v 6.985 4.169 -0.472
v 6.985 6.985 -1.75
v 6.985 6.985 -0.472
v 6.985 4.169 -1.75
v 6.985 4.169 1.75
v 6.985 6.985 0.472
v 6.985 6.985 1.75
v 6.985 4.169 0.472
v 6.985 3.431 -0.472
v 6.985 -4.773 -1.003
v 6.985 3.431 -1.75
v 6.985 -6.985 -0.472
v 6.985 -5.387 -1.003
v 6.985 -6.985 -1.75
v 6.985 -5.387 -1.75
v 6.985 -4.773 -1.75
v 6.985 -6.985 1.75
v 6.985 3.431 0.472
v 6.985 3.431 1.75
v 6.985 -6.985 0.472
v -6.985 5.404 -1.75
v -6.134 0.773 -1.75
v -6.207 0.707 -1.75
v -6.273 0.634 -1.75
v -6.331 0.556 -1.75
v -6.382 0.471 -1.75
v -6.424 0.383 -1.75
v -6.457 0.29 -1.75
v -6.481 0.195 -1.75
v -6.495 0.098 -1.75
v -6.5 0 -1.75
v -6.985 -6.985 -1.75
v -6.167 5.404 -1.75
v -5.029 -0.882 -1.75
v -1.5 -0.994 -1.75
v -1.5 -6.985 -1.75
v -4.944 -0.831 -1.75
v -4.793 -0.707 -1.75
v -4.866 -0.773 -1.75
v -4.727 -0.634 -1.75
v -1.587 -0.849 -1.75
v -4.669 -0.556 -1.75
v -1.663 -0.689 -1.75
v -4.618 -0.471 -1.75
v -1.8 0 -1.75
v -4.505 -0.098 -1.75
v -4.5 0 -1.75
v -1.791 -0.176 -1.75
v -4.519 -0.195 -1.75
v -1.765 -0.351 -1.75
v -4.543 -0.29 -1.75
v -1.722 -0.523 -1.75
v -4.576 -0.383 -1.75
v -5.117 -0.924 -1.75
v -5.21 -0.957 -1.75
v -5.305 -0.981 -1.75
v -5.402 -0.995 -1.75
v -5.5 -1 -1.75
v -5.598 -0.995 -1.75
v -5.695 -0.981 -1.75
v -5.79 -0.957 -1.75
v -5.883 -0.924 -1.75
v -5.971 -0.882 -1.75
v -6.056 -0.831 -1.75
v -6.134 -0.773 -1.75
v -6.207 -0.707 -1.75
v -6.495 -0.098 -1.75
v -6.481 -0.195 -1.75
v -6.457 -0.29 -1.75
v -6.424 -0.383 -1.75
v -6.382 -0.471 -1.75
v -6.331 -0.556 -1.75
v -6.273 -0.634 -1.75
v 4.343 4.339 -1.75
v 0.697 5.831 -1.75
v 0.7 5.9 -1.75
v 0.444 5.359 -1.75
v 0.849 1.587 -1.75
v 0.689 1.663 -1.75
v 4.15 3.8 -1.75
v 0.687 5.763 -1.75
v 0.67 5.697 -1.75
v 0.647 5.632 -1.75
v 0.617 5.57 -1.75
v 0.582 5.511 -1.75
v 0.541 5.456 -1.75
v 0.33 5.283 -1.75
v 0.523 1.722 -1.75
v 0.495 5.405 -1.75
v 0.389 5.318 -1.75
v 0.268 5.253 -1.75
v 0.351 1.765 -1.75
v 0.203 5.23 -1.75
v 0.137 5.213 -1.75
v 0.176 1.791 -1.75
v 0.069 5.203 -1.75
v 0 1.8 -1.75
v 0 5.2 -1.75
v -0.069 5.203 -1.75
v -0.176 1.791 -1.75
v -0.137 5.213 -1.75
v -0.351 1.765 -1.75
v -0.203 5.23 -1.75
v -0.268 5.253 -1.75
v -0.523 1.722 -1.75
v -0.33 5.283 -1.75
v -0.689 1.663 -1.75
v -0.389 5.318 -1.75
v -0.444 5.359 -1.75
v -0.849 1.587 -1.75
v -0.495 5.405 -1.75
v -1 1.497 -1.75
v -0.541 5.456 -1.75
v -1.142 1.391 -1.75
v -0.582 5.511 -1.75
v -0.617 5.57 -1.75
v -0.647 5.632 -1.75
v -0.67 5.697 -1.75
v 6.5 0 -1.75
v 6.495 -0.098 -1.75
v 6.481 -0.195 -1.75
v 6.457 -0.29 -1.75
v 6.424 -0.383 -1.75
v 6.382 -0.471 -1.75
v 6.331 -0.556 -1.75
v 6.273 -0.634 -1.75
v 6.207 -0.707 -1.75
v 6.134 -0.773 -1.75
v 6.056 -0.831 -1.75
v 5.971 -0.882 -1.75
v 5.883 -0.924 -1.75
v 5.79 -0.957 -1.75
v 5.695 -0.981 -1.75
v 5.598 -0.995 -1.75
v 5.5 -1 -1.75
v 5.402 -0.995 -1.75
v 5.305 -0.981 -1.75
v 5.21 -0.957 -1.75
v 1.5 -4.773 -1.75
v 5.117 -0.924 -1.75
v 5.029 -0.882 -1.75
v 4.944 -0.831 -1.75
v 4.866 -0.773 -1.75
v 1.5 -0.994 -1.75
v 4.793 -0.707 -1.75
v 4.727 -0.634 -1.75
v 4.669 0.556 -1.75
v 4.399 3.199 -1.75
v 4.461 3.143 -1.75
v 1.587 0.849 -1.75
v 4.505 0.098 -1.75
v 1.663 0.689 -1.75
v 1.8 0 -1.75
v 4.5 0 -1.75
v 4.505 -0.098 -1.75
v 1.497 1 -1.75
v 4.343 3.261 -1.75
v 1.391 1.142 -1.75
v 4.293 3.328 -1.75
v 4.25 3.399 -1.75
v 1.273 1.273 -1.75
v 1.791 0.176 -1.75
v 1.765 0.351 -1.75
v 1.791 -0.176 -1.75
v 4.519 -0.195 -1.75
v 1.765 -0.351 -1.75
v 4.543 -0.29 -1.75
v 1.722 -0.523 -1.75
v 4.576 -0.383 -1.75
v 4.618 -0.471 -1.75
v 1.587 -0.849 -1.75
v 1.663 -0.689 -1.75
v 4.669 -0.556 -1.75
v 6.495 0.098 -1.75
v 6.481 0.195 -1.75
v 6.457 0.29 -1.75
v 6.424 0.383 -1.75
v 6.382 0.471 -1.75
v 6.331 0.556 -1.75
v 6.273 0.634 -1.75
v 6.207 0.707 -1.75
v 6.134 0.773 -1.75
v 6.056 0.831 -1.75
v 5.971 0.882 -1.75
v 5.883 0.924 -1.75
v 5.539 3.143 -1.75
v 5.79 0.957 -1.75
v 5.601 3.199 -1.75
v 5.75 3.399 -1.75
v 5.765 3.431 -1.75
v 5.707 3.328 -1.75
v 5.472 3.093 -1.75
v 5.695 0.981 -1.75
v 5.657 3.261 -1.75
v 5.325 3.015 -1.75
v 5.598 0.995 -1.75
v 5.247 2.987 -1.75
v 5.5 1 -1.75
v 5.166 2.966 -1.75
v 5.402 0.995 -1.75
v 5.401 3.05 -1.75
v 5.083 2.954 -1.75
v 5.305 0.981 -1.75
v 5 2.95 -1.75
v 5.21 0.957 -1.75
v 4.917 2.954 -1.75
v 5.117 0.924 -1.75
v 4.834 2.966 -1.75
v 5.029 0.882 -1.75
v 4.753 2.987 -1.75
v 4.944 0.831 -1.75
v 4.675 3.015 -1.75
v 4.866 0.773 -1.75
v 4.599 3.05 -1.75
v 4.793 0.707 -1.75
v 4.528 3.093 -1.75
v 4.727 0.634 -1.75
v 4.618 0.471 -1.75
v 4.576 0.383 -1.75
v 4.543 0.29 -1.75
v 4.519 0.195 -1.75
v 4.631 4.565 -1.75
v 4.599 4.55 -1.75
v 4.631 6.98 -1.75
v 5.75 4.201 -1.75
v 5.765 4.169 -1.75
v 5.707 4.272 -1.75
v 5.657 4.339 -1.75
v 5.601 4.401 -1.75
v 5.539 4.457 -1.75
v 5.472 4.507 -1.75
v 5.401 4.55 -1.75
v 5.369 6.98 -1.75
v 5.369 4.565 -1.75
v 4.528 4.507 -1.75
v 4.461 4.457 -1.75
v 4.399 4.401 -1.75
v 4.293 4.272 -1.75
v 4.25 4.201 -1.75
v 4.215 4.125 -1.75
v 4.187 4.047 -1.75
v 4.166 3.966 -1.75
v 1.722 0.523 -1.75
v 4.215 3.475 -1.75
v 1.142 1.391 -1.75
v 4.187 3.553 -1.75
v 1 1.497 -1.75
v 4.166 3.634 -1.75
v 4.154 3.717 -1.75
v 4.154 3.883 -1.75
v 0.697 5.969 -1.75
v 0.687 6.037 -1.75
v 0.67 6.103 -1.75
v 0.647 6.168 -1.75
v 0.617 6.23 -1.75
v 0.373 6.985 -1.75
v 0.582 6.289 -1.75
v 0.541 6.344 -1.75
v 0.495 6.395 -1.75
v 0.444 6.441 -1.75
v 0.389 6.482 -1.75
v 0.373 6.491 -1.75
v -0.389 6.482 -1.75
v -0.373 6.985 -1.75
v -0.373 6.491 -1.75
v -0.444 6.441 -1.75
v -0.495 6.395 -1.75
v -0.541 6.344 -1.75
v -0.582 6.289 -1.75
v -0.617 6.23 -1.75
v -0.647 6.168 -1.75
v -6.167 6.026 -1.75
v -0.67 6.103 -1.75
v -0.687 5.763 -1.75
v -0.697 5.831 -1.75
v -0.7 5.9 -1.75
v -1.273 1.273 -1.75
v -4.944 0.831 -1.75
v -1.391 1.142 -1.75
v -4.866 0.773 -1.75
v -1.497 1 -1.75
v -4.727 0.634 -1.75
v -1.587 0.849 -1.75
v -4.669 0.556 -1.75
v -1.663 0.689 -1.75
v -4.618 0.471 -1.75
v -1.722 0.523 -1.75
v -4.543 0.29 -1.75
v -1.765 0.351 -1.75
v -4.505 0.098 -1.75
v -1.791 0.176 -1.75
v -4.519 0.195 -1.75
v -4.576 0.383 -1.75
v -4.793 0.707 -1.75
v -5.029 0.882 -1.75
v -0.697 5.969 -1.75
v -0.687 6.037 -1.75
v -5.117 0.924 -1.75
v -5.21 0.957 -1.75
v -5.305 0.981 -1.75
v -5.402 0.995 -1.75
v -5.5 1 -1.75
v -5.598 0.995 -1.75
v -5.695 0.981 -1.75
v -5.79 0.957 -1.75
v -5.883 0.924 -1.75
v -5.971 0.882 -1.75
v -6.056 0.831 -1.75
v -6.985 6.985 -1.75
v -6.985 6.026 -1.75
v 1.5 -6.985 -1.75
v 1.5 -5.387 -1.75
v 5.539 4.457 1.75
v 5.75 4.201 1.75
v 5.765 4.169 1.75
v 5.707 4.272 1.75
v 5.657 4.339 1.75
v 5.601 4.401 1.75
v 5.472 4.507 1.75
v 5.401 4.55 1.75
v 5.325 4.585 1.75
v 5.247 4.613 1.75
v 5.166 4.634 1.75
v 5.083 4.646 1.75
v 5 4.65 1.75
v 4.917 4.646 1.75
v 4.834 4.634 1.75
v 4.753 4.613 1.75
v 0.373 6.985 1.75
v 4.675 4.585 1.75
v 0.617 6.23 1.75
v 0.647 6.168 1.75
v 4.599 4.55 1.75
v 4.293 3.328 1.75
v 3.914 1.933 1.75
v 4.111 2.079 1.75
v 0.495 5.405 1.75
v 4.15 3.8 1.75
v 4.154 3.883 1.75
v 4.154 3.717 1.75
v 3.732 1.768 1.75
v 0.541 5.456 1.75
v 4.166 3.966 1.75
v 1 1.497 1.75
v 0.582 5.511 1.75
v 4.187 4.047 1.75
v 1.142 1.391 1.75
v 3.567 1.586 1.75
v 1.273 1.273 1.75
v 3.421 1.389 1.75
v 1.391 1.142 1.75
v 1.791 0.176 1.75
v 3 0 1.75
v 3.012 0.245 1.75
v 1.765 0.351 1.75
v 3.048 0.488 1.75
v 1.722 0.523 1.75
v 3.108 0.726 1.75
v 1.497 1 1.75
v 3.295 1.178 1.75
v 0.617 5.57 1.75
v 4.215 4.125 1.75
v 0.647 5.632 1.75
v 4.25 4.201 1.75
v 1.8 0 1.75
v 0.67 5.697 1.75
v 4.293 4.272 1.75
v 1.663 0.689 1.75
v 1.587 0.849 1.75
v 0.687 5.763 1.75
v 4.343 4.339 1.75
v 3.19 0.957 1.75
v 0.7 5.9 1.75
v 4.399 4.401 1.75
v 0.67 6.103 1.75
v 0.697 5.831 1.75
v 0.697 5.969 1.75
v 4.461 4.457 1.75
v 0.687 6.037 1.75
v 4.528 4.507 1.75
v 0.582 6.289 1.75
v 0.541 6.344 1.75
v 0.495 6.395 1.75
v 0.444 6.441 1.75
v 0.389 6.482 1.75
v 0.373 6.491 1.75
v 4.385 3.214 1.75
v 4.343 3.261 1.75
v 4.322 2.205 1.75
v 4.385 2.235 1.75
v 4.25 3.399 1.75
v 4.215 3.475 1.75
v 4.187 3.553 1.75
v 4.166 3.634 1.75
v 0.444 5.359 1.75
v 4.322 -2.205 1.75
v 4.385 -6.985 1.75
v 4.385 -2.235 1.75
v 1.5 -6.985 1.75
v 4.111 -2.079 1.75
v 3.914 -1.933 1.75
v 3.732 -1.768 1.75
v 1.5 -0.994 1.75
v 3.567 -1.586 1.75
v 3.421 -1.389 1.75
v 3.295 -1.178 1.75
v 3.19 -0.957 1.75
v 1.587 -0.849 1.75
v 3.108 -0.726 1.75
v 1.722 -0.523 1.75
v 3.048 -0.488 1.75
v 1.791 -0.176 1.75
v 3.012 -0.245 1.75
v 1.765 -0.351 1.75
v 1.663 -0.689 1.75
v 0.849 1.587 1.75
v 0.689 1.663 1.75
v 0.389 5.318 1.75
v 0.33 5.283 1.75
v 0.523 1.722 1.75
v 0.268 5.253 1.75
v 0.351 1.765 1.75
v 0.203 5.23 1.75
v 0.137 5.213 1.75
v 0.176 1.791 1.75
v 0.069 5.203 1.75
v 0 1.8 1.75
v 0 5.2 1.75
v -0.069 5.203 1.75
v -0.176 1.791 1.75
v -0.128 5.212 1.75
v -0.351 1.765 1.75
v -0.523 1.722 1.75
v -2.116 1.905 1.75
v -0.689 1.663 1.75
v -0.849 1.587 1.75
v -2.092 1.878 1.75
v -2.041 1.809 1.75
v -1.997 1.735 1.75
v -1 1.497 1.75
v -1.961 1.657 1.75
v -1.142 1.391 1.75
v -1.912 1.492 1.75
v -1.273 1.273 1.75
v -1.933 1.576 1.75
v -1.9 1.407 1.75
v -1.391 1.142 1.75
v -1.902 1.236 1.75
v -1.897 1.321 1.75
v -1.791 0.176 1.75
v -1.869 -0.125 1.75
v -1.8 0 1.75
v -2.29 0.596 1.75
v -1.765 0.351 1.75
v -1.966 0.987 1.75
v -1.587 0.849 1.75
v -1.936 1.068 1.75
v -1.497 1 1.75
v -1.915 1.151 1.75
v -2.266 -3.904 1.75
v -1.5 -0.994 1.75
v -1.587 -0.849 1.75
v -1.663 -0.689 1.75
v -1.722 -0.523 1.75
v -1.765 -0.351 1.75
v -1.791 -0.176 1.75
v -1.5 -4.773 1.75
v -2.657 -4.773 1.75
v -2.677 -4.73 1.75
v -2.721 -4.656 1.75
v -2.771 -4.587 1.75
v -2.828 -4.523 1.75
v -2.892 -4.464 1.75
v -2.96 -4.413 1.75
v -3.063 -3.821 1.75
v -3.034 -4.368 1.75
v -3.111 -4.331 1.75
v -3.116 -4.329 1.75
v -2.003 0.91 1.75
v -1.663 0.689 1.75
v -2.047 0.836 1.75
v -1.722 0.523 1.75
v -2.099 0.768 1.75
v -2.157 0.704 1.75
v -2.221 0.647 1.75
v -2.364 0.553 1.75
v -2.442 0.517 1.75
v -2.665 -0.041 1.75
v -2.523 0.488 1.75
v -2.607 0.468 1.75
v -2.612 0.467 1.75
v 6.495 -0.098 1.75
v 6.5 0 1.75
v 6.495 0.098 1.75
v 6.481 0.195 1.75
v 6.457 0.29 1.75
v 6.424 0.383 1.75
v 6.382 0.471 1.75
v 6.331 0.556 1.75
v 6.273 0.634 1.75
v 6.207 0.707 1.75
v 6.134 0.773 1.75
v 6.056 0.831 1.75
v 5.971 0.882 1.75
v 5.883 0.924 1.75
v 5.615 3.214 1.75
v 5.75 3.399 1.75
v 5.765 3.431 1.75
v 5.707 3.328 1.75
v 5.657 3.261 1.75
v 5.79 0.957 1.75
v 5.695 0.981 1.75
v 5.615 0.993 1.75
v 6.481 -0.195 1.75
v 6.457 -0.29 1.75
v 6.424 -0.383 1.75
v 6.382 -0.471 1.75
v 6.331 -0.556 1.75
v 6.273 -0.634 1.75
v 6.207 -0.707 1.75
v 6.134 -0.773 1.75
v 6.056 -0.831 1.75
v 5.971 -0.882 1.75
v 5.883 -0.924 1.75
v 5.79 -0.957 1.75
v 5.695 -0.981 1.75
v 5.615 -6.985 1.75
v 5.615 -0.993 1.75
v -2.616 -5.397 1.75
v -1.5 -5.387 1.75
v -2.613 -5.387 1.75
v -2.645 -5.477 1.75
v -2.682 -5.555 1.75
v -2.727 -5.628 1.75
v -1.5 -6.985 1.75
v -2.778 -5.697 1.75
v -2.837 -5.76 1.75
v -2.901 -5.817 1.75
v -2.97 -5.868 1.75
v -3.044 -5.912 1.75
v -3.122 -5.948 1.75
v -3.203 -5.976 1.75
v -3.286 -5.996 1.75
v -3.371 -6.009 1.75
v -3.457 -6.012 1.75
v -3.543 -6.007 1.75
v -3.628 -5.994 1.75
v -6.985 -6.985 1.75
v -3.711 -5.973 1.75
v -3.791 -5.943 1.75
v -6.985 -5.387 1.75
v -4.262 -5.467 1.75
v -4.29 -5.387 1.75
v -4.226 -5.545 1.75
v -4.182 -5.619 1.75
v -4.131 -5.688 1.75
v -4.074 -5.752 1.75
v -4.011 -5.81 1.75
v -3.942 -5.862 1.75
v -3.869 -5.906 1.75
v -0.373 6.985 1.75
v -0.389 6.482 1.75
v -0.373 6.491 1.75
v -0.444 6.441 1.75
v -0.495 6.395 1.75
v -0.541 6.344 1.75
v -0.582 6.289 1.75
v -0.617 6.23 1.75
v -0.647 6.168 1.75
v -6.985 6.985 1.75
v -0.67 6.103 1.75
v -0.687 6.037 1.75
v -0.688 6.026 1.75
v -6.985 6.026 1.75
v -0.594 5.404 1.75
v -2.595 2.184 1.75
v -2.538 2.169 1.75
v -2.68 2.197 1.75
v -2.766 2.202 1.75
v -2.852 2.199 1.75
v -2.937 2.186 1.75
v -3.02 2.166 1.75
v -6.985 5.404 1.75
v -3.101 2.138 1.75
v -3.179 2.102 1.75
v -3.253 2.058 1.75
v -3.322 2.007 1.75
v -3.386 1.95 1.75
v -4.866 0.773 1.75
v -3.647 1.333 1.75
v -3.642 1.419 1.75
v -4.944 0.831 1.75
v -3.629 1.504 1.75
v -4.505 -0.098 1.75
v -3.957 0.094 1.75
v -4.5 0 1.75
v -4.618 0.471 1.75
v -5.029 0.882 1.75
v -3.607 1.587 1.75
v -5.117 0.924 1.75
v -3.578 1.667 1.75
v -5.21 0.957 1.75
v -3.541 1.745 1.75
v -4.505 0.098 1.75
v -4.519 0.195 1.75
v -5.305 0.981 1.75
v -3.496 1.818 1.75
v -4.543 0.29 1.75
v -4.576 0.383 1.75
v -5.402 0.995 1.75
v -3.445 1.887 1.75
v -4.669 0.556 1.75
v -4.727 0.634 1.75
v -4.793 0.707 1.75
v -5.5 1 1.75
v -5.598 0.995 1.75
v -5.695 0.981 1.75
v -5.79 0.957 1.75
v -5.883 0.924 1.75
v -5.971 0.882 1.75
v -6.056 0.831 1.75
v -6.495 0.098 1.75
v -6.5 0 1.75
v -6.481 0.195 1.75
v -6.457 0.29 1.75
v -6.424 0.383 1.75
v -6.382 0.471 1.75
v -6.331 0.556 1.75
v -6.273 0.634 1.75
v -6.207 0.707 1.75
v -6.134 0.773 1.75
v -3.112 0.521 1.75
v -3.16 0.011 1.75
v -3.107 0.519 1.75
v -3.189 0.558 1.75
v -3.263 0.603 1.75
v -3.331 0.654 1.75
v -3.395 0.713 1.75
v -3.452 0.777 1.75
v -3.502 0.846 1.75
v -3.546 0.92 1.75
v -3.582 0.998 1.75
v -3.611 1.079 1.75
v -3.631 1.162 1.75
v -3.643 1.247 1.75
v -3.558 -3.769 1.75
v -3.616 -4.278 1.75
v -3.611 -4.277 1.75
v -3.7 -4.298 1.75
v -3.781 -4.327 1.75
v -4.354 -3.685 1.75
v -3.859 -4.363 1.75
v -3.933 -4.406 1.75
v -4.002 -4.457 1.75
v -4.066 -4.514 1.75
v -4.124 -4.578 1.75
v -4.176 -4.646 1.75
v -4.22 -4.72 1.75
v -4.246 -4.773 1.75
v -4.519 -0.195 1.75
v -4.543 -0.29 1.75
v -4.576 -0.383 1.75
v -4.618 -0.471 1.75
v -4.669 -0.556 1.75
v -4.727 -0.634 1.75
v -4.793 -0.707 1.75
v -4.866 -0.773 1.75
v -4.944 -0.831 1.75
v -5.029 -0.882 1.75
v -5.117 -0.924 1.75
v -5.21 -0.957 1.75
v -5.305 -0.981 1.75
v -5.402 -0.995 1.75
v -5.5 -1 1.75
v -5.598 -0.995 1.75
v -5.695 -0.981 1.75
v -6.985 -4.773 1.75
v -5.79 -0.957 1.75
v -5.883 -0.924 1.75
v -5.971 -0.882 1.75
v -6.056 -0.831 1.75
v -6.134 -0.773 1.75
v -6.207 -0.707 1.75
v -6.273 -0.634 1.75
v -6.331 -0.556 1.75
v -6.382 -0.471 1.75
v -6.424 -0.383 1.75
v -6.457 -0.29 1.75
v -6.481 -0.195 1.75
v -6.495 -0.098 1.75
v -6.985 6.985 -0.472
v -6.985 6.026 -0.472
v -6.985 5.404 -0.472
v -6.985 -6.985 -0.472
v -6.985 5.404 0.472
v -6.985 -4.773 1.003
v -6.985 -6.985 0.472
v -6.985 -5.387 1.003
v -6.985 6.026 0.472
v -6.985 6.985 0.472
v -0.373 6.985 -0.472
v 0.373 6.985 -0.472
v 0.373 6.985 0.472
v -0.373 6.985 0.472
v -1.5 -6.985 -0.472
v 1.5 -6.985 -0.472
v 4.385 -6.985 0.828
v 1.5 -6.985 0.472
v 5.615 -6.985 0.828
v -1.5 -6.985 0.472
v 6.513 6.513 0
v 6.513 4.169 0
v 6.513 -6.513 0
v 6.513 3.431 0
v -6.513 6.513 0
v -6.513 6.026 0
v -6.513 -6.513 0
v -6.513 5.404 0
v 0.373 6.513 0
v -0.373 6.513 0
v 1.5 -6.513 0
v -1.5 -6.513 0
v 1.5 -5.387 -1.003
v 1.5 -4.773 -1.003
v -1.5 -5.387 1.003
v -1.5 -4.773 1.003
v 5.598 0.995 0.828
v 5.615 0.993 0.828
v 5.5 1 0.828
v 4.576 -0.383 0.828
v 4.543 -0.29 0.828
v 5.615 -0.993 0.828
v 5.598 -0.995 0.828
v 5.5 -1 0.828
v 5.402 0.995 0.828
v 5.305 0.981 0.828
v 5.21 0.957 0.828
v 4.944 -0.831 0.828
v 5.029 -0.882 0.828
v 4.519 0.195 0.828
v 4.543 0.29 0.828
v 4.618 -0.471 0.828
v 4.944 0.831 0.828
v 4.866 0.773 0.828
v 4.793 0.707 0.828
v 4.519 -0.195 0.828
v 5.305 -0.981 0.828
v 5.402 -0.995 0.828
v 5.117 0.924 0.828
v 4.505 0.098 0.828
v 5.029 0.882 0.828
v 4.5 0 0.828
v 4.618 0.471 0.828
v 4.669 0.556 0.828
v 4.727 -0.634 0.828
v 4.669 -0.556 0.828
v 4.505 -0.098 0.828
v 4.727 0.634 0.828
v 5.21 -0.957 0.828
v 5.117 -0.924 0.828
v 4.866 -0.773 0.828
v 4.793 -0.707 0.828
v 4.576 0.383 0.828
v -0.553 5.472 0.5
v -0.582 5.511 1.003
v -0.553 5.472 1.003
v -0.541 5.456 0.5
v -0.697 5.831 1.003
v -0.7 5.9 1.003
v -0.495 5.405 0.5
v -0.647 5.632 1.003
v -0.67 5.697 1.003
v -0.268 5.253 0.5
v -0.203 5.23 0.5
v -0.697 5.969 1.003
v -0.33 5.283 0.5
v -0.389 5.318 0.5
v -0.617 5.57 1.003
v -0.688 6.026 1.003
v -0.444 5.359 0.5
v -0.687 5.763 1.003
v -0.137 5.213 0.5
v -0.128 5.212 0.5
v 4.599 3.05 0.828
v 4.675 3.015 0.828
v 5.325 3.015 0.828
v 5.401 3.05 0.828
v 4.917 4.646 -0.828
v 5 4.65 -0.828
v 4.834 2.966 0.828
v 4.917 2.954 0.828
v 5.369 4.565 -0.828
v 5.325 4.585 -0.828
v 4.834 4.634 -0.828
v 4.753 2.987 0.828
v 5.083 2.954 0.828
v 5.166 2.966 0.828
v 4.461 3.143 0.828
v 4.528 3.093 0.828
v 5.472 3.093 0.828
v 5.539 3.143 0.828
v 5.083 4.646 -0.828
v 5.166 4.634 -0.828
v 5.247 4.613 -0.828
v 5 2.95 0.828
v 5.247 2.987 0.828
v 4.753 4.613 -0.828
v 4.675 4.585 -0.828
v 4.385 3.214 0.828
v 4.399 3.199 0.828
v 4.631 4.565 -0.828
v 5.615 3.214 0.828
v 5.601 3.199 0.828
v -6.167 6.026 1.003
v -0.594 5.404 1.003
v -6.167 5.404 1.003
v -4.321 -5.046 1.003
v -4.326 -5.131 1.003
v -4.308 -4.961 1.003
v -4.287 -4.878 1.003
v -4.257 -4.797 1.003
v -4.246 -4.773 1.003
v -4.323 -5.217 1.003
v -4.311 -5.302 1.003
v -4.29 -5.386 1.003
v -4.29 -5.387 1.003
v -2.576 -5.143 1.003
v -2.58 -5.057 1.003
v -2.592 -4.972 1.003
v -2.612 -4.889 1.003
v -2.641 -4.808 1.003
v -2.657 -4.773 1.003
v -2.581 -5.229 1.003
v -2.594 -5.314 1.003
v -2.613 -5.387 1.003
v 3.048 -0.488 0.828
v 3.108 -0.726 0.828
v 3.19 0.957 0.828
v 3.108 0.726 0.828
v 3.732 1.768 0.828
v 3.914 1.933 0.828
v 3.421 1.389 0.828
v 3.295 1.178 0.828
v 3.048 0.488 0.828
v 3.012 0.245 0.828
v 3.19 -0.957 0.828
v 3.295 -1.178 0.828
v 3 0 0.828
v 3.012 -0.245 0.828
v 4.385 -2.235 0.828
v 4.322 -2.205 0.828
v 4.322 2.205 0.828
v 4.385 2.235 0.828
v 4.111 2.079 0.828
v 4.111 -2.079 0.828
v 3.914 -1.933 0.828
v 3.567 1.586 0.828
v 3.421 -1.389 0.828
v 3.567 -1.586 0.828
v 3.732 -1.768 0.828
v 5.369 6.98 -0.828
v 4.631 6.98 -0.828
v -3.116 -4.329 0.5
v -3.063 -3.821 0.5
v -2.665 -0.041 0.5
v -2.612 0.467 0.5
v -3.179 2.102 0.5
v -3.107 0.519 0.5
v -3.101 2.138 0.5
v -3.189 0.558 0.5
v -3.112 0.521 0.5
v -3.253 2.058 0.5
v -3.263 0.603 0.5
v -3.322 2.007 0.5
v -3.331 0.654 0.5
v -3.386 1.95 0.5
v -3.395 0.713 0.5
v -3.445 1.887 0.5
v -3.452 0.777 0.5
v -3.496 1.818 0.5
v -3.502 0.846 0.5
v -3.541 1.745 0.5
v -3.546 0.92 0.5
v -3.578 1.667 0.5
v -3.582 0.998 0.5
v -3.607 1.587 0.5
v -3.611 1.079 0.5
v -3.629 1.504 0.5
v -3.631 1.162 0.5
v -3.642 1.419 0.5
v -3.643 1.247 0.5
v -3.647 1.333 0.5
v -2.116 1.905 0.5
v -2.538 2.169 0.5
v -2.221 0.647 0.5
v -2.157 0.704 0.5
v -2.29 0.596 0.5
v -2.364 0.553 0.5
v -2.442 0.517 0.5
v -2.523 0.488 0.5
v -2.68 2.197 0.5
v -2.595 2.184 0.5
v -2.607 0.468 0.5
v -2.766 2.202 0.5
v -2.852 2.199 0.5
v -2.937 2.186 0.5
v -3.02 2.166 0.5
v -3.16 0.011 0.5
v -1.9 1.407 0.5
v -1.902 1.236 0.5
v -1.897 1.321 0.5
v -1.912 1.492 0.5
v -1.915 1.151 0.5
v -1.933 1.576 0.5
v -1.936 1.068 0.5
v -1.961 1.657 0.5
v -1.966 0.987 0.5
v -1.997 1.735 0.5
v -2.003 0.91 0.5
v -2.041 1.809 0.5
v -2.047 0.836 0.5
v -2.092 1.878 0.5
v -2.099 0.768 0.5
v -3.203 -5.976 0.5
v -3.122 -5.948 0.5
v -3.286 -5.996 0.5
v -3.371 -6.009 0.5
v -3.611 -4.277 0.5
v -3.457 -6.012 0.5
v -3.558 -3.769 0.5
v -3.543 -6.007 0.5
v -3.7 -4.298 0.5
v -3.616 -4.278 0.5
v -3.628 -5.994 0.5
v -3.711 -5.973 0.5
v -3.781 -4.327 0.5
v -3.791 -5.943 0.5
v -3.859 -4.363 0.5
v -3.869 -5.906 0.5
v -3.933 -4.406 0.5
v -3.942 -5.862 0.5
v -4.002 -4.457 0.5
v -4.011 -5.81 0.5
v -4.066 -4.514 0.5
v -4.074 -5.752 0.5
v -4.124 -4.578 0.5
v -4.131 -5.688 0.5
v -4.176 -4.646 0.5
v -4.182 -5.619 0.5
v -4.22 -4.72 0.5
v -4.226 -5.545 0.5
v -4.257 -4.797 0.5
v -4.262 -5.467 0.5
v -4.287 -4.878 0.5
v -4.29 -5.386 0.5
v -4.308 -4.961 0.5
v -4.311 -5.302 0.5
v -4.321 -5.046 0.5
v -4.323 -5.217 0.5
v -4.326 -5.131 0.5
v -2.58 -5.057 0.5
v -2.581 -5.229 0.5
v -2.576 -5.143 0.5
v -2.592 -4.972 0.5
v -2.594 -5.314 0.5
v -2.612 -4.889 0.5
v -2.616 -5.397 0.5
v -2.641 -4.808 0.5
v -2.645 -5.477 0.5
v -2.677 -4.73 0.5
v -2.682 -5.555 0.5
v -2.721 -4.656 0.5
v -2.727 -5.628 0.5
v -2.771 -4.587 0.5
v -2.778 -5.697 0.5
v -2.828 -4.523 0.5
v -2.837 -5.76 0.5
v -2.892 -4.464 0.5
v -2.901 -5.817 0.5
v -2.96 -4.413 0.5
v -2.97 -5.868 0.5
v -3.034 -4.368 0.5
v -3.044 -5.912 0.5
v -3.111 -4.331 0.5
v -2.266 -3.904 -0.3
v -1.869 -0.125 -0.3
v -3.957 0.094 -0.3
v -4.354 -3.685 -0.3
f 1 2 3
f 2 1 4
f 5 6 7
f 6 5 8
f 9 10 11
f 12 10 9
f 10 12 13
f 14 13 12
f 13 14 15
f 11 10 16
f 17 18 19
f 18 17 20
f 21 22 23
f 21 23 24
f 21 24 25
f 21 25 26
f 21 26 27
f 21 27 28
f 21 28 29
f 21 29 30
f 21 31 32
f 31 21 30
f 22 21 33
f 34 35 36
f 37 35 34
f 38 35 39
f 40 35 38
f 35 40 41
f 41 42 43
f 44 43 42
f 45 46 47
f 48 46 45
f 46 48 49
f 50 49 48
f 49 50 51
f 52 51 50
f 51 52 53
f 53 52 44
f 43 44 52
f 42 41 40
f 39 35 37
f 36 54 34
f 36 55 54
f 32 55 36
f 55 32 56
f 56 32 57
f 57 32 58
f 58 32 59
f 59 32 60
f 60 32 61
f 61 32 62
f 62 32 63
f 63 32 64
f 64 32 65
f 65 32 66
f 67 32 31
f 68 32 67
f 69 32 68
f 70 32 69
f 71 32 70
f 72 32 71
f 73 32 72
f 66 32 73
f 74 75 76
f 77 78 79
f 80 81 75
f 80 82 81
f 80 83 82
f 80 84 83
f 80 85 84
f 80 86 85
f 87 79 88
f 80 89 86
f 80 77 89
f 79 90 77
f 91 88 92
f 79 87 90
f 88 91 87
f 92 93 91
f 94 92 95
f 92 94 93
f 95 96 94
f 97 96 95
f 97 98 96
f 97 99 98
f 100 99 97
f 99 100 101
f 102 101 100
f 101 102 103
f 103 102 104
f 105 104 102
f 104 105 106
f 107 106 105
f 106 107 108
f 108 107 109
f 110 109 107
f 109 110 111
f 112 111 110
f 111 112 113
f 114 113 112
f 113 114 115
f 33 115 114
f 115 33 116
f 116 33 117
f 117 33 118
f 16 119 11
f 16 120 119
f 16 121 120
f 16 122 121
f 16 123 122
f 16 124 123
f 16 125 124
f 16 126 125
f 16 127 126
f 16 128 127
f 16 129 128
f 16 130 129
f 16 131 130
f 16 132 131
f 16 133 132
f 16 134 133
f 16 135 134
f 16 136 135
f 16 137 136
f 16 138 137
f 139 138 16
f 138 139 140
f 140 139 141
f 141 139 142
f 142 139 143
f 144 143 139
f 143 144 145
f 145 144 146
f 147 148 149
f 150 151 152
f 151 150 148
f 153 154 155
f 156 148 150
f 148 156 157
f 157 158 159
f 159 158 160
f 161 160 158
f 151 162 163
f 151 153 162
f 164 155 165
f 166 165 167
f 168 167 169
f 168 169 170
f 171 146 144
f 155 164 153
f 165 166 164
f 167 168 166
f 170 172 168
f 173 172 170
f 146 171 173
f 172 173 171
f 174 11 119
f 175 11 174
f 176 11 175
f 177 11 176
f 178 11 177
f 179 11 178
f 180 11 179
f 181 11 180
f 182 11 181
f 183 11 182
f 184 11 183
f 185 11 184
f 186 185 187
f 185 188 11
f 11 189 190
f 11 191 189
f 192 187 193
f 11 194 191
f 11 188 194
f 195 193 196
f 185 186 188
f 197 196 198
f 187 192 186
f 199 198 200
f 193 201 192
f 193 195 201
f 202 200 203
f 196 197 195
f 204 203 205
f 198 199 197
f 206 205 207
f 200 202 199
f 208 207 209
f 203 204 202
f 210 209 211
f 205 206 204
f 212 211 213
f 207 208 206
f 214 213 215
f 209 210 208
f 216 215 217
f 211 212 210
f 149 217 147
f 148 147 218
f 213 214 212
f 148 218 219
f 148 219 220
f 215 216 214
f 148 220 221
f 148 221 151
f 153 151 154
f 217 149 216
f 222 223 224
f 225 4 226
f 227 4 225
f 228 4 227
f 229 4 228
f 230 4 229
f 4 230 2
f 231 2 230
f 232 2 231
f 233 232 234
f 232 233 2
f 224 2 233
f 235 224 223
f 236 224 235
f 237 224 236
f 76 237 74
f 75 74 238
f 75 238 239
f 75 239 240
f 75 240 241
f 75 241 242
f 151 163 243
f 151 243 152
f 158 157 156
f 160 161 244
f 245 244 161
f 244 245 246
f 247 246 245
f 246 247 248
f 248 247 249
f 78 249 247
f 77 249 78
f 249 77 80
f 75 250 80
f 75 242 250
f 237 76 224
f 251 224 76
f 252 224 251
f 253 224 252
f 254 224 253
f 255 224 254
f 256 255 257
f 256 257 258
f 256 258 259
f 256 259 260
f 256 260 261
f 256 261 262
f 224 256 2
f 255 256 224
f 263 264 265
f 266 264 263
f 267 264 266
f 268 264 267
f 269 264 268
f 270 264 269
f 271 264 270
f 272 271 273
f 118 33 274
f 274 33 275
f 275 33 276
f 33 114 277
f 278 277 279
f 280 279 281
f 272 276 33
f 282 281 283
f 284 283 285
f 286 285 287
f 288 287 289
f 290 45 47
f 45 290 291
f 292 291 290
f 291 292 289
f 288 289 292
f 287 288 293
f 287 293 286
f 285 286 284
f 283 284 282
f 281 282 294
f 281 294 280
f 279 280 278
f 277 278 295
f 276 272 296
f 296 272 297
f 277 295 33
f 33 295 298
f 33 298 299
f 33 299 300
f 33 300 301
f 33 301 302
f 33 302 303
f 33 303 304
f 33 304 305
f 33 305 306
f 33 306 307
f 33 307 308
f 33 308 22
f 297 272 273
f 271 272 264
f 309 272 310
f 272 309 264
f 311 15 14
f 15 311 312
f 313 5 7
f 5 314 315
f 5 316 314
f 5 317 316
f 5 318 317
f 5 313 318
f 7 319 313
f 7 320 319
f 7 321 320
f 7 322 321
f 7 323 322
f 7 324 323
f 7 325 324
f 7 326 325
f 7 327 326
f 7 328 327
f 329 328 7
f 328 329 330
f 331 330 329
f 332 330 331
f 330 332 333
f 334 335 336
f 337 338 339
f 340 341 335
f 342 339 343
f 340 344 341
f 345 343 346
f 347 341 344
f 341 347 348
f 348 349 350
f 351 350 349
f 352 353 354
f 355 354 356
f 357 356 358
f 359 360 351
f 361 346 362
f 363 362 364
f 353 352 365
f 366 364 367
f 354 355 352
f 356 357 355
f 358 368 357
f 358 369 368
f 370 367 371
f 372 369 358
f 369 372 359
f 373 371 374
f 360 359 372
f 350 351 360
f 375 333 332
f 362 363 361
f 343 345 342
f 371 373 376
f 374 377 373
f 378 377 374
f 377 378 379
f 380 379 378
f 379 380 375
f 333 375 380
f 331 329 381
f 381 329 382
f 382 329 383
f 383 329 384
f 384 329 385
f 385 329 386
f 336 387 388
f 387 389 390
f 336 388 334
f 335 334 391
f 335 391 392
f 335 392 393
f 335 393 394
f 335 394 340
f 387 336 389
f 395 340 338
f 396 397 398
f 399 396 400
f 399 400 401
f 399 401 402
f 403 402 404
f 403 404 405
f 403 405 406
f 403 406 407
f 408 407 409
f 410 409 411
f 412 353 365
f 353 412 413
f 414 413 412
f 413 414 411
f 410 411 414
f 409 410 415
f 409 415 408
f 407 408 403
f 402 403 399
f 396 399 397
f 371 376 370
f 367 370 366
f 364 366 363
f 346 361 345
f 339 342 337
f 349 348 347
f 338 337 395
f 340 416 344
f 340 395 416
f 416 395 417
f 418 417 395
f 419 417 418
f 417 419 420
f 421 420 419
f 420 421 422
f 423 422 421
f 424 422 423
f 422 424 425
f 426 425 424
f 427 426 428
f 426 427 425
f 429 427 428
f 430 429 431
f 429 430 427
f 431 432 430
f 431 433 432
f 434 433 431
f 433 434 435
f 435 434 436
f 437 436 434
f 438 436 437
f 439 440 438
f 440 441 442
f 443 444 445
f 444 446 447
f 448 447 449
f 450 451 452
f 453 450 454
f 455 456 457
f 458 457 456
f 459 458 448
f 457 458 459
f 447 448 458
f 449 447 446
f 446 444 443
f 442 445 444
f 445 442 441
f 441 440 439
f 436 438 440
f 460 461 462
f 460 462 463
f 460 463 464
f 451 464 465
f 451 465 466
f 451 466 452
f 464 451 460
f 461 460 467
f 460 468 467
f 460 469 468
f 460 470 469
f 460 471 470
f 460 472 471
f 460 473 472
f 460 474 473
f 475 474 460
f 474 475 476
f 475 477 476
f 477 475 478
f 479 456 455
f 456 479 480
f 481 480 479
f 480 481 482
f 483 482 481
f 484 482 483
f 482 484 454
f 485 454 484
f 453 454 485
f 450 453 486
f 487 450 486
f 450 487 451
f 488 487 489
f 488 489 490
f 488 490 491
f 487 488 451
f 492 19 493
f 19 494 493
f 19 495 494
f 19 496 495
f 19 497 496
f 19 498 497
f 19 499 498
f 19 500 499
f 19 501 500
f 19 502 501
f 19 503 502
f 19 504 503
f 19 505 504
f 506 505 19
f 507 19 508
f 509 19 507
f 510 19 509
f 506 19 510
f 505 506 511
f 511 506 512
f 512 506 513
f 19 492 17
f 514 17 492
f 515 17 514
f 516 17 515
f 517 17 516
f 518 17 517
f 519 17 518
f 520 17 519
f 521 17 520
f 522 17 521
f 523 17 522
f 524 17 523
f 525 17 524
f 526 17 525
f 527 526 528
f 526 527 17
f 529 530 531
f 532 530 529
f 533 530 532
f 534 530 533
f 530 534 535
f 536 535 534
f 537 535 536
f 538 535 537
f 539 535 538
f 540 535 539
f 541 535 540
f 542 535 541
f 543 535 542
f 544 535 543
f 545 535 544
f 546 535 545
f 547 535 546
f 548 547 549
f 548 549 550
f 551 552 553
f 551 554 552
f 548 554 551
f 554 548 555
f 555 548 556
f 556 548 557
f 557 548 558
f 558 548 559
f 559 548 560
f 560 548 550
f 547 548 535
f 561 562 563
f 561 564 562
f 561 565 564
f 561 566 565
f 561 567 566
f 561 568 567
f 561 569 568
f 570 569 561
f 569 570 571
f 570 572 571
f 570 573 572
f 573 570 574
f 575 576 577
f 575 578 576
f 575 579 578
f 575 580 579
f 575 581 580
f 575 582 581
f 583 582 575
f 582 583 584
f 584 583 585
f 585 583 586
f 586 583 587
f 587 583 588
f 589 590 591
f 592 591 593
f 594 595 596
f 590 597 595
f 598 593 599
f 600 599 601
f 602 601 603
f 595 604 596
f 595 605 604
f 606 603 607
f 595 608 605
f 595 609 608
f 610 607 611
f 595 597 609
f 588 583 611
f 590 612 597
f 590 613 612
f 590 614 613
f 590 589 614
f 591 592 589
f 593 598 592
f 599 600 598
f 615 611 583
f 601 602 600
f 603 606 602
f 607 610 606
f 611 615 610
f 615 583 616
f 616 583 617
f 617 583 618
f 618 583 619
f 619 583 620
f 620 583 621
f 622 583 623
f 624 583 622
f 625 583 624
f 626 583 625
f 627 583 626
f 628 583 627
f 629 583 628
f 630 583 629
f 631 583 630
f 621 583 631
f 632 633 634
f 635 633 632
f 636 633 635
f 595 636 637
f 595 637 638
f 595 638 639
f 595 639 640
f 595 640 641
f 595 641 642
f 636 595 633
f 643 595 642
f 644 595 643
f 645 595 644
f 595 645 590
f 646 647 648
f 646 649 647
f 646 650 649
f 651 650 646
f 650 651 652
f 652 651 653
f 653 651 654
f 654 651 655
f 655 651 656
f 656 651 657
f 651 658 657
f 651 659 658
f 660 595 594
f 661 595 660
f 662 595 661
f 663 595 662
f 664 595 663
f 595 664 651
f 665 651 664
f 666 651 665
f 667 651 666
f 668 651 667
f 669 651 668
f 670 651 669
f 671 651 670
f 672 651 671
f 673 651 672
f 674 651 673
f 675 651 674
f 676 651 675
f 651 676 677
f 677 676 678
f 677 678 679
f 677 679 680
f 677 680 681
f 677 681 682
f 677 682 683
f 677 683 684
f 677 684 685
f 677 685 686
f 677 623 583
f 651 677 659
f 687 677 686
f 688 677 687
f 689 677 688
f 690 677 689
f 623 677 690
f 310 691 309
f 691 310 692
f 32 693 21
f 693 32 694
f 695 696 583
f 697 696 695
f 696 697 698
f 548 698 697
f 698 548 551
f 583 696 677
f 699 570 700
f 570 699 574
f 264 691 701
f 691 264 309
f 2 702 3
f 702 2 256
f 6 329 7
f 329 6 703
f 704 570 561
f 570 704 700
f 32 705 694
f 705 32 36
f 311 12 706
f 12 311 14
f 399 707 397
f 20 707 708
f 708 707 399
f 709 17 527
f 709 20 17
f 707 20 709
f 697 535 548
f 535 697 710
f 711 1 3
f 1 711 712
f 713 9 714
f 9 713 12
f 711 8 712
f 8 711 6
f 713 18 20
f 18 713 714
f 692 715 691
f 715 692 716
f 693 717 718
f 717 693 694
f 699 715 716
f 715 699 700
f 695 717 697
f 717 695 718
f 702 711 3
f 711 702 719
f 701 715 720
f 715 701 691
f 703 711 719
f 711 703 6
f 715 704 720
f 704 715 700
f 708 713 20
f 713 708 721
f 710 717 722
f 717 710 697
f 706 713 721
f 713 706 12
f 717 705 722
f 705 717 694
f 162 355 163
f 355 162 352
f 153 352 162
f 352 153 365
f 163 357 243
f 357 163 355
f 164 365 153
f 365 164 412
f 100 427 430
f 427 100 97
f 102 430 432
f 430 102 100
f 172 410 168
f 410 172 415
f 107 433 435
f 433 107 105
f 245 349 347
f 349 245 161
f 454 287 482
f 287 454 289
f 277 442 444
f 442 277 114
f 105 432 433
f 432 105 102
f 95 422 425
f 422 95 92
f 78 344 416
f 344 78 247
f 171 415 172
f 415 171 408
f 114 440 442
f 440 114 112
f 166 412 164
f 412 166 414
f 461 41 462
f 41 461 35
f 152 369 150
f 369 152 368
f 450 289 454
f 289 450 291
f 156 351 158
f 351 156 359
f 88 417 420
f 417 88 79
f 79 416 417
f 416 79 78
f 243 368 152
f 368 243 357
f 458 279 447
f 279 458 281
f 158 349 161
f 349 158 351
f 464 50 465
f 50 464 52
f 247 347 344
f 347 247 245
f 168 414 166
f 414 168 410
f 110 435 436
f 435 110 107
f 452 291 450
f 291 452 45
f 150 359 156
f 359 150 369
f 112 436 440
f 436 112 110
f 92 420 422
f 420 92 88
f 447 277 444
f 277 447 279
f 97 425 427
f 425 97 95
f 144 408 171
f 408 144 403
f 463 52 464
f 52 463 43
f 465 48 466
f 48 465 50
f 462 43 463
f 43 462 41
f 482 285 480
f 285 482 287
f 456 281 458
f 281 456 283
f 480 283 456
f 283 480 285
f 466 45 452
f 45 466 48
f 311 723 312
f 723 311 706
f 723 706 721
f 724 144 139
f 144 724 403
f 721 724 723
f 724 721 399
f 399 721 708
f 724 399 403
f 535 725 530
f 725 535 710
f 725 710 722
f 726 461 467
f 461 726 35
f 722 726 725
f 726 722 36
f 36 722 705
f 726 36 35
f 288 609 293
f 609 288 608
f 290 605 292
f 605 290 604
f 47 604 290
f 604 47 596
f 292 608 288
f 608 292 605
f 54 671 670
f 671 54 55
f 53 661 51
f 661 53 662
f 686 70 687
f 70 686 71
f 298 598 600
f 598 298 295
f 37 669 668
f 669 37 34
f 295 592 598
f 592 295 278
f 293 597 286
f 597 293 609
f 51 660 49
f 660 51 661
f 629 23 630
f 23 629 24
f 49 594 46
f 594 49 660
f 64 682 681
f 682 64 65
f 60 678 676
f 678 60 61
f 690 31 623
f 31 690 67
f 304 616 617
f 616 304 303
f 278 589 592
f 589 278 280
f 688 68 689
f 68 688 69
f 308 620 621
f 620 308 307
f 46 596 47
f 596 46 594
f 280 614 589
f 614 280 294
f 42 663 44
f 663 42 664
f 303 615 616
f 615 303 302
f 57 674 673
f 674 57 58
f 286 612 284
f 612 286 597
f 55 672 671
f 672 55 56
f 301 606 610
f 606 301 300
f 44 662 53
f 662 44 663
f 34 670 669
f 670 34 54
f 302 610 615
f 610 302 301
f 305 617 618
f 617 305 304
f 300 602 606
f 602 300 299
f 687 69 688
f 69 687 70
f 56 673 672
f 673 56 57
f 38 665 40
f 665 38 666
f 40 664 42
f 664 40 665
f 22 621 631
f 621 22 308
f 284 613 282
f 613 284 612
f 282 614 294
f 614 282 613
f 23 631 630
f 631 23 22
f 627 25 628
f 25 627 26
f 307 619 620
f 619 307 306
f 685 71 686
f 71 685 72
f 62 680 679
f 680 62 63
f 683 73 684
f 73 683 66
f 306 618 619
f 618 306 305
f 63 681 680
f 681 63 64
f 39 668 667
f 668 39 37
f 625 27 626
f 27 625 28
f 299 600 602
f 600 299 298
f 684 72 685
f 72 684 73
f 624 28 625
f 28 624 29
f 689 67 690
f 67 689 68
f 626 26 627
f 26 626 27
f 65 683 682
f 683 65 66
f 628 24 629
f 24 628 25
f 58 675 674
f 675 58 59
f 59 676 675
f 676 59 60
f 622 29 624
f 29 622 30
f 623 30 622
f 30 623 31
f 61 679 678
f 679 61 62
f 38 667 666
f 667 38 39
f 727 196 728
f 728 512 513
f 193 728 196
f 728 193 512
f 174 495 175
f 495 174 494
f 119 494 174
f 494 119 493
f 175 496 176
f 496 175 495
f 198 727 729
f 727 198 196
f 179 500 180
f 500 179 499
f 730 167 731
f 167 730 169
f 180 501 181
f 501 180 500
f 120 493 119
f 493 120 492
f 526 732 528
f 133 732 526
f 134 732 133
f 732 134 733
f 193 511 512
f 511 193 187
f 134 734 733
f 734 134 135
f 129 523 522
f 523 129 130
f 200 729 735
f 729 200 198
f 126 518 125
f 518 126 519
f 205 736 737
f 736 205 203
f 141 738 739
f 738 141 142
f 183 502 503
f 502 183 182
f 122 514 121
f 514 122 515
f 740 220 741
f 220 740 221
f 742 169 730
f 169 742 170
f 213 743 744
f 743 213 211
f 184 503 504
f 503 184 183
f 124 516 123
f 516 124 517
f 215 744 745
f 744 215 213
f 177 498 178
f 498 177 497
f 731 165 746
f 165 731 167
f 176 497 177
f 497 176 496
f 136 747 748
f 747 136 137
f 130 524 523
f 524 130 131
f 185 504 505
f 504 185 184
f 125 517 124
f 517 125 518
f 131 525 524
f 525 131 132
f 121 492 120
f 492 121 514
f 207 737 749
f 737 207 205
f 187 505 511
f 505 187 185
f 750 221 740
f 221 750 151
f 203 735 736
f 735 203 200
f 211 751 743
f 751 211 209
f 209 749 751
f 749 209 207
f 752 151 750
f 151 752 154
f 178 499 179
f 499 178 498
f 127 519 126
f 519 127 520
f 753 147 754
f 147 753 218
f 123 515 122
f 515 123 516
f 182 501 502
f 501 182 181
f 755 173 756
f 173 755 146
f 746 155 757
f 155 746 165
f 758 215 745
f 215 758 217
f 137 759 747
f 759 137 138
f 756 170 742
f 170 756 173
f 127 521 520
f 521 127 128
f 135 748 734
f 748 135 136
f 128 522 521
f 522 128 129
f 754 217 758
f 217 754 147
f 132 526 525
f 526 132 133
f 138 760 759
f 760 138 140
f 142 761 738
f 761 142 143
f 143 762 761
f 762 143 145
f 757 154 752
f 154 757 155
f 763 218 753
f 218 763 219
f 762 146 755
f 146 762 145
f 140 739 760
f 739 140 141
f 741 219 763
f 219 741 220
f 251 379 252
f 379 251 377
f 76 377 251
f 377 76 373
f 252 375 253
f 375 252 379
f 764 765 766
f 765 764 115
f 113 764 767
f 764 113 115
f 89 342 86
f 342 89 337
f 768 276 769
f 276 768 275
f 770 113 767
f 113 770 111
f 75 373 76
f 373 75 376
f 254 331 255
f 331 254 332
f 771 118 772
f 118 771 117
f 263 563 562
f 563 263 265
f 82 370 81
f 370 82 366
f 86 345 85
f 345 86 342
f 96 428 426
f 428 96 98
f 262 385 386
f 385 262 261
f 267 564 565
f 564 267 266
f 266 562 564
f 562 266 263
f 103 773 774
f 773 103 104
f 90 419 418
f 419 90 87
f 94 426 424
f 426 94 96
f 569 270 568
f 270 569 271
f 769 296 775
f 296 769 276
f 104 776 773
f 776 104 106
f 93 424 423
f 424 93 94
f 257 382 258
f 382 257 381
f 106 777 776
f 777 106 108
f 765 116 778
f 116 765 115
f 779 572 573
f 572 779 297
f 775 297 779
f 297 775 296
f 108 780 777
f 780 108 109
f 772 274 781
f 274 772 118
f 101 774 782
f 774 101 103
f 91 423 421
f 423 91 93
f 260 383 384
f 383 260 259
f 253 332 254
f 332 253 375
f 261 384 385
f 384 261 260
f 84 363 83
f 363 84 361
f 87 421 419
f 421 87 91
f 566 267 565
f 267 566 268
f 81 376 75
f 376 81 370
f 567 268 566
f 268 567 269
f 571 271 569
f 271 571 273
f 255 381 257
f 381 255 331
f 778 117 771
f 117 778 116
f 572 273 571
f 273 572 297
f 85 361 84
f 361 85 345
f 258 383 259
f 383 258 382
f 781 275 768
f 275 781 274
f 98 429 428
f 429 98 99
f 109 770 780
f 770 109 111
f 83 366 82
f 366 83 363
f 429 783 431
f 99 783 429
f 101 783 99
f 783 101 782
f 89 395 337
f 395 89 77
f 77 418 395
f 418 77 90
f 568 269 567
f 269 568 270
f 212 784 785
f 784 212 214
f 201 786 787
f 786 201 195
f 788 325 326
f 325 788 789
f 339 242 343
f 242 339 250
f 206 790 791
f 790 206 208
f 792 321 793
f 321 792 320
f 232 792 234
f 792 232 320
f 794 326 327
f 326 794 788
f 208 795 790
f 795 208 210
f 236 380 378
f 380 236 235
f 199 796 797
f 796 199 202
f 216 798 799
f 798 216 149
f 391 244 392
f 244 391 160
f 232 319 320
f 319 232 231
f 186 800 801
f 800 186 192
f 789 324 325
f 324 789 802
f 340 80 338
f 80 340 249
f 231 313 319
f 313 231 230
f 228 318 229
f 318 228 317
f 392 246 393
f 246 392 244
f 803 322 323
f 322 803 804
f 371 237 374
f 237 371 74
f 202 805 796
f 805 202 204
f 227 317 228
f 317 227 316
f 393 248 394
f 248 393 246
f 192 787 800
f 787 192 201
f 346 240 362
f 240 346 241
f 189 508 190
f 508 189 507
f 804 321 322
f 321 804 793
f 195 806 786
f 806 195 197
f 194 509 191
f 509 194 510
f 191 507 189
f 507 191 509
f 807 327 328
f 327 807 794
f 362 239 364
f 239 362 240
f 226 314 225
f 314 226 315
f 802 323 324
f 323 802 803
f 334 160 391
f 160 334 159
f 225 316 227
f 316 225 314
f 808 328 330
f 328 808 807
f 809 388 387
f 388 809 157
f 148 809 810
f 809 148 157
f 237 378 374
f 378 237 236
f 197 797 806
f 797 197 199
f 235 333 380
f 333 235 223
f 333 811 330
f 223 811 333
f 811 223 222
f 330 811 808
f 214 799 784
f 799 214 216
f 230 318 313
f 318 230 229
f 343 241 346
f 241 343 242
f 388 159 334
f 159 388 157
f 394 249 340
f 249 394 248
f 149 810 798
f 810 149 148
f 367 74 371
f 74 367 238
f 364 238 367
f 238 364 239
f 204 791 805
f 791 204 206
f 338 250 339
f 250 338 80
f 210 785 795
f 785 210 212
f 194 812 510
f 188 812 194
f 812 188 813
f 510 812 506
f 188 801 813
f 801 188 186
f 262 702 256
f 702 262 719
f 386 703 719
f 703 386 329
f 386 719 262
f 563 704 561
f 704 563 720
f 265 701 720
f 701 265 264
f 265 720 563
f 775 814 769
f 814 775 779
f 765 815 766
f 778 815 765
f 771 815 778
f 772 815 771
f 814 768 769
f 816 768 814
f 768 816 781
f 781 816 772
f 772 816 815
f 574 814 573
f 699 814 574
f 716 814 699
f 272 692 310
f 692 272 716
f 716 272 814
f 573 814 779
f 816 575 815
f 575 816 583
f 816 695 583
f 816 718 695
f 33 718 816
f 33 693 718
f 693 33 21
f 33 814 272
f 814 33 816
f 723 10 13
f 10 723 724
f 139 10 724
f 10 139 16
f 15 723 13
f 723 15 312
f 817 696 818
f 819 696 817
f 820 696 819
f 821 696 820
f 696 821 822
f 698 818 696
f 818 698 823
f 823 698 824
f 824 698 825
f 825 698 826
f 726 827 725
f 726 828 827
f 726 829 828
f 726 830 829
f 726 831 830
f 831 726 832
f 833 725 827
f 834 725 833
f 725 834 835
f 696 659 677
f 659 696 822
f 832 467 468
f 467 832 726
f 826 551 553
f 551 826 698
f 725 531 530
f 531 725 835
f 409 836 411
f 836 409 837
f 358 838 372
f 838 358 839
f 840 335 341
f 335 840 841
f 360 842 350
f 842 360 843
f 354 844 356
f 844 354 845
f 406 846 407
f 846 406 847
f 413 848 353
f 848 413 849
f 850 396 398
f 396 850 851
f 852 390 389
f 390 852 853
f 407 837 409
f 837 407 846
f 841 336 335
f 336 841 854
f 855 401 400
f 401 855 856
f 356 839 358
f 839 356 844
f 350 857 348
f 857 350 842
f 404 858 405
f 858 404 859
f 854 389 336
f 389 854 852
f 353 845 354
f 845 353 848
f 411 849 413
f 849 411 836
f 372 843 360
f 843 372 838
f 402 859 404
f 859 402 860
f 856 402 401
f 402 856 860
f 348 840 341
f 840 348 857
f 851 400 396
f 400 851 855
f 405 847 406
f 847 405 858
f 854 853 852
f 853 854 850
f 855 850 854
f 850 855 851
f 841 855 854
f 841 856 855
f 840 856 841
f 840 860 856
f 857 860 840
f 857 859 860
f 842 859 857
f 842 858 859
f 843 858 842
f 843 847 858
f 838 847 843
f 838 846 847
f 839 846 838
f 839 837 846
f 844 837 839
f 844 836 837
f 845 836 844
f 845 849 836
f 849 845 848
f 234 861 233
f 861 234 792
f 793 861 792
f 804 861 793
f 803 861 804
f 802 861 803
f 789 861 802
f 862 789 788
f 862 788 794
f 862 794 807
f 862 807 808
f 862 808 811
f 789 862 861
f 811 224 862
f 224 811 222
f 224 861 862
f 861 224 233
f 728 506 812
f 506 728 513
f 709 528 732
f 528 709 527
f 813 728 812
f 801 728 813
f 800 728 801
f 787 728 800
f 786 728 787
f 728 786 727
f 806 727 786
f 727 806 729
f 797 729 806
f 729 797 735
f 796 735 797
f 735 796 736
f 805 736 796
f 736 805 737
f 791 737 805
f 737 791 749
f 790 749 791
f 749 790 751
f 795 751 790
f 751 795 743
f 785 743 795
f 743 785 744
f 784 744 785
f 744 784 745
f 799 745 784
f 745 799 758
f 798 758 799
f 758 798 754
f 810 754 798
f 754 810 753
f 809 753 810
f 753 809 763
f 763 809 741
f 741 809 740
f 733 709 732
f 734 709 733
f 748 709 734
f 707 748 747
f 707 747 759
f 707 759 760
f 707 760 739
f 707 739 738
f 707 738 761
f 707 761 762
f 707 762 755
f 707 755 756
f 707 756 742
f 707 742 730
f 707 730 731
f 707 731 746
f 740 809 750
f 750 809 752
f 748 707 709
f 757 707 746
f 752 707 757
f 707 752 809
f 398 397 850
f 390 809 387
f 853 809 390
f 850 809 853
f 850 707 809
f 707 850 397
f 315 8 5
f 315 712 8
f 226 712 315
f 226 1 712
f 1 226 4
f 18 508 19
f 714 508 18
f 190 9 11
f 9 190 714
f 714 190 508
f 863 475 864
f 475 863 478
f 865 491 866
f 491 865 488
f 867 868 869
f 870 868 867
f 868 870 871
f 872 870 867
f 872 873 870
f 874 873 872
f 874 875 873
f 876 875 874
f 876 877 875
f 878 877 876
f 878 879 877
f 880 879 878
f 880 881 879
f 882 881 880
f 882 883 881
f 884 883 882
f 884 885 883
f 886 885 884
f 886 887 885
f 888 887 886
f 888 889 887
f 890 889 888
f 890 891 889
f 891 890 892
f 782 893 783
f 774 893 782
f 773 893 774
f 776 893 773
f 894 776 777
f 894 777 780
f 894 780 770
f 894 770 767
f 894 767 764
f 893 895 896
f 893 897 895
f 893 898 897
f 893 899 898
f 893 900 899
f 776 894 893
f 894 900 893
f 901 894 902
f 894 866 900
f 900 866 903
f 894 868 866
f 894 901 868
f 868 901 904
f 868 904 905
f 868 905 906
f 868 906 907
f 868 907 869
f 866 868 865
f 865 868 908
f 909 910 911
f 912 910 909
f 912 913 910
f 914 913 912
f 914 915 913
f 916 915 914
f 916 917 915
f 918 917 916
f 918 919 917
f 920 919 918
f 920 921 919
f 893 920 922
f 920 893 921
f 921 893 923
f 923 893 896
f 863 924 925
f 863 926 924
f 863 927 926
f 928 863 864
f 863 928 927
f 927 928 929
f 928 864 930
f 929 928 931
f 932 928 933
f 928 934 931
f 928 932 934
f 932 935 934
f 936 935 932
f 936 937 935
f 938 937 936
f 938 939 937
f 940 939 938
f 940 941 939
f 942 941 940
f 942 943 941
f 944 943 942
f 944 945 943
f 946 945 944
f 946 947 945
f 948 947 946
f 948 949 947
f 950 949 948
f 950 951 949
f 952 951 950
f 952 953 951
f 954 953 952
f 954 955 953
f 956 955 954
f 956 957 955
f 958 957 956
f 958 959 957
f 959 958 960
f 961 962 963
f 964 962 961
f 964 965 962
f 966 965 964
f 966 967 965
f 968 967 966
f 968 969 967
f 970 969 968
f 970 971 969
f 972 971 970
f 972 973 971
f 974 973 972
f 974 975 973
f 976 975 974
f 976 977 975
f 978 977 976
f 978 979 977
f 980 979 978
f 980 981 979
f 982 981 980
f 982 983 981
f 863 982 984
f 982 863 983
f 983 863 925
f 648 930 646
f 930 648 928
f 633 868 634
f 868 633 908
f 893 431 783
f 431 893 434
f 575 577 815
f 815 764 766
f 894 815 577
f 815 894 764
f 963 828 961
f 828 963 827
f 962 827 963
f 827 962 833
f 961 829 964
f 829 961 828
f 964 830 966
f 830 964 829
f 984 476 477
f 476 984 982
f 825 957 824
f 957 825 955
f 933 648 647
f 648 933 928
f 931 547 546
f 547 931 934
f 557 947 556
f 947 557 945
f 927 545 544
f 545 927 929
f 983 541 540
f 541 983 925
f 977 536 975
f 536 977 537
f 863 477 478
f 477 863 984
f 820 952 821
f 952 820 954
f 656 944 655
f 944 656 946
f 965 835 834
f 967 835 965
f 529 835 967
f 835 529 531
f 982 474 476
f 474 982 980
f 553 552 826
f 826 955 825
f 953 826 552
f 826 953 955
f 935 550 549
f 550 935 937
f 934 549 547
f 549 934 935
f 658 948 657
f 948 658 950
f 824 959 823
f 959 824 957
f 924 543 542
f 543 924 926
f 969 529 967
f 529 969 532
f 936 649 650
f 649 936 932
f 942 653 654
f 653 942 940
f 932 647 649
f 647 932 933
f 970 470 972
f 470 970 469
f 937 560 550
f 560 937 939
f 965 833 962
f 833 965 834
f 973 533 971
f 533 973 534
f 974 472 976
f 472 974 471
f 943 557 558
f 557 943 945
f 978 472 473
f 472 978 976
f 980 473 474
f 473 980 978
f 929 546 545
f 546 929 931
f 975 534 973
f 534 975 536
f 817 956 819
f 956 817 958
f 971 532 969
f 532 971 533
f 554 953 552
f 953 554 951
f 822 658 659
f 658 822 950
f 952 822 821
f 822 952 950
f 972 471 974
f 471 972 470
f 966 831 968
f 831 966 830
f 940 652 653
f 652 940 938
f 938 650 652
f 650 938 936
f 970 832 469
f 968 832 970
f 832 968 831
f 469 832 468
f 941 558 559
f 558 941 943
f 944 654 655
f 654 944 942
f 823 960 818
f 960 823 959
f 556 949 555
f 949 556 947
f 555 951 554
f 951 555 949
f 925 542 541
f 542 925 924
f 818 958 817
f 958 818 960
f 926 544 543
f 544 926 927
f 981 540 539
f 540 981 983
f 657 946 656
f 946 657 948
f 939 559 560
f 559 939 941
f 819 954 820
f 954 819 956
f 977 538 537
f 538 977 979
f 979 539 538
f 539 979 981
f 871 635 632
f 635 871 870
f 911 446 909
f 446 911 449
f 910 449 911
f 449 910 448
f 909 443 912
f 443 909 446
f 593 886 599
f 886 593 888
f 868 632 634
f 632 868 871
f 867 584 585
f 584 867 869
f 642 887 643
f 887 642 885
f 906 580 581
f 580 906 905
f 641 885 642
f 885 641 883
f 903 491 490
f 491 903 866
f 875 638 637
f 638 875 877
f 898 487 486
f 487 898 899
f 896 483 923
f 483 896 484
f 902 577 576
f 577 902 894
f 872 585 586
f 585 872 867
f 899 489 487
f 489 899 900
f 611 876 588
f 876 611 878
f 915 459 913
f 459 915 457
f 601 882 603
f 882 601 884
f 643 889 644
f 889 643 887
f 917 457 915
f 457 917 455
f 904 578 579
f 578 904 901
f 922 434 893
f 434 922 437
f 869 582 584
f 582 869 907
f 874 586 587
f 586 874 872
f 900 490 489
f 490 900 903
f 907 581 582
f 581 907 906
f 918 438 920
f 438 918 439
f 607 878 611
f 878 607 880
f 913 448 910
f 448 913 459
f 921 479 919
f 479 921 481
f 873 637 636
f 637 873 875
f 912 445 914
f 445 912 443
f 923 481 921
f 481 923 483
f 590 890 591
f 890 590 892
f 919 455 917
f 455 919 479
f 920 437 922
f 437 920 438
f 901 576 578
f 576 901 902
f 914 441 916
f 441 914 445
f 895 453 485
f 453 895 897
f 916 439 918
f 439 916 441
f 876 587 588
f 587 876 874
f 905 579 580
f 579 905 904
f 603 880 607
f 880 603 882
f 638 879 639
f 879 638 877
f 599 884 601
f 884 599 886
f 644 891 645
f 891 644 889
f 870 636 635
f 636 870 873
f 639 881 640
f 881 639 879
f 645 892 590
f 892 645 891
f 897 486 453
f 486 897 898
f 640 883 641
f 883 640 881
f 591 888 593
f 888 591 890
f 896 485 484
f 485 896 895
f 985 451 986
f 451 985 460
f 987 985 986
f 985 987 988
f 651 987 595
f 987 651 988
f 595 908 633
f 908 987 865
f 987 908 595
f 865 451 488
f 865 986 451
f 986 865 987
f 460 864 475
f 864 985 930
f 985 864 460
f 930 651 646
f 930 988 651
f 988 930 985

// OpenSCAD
$fn = 64;
grid = 1.27;

diode_gauge_mm = 0.508;
wire_gauge_mm = 0.559;

pin2 = [0, 5.9, 1.4];
pin1 = [5, 3.8, 1.7];

stem = [0, 0, 3.6];
peg1 = [-5.5, 0, 2];
peg2 = [5.5, 0, 2];
base = [11*grid, 11*grid, 3.5];

diode_dia = diode_gauge_mm * 0.98;
wire_dia = wire_gauge_mm * 1.1;

diode_angle = -6;

slot_size = 1.75;

// diode_mock();

rotate([0,180, 0])
    mirror([1,0,0])
        difference(){
            make_body();
            left_pin_wire_slots();
            right_pin_wire_slots();
            diode_slot();
        }

module make_body(){
    difference(){
        translate([0, 0, 0]){
            cube([base.x, base.y, base.z], center = true);
        }

        // Side Slots for removal
        translate([7.75, 0, 0])
            rotate([0, 45, 0])
                cube([slot_size, 20, slot_size], center = true);

        translate([-7.75, 0, 0])
            rotate([0, 45, 0])
                cube([slot_size, 20, slot_size], center = true);

        translate([0, 7.75, 0])
            rotate([45, 0, 0])
                cube([20, slot_size, slot_size], center = true);

        translate([0, -7.75, 0])
            rotate([45, 0, 0])
                cube([20, slot_size, slot_size], center = true);

        // Main Stem Clamp
        translate([stem.x, stem.y, 0]){
            cylinder(h=base.z*2, d=stem[2], center = true);
        }

        translate([0, -5, 0]){
            cube([3, 10, base.z*2], center = true);
        }

        // PCB Mount Pegs
        translate([peg1.x, peg1.y, 0]){
            cylinder(h=base.z*2, d=peg1[2], center = true);
        }

        translate([peg2.x, peg2.y, 0]){
            cylinder(h=base.z*2, d=peg2[2], center = true);
        }

        // Switch Pins
        translate([pin2.x, pin2.y, 0]){
            cylinder(h=base.z*2, d=pin2[2], center = true);
        }

        translate([pin1.x, pin1.y, 0]){
            cylinder(h=base.z*2, d=pin1[2], center = true);
        }

    }
}

module left_pin_wire_slots(){
    // Diode Pin Wire Channels
    translate([pin2.x, 5*grid, 0])
        cube([1.5*diode_dia, 2, base.z*2], center = true);

    translate([-4, 4.5*grid, -base.z/2])
        cube([8, 1.25*diode_dia, 3*diode_dia], center = true);

    translate([-5.25*grid, 4.5*grid, 0])
        cube([1, 1.25*diode_dia, base.z*2], center = true);

    translate([5, -4*grid, base.z/2])
        cube([8, wire_dia, 3*diode_dia], center = true);
    
    translate([-4*grid, -4*grid, -base.z/2])
        cube([8, wire_dia, 3*diode_dia], center = true);

}

module right_pin_wire_slots(){
    translate([pin1.x, 4*grid, base.z/2])
        cube([1.2*wire_dia, pin1.y, 3*wire_dia], center = true);
    translate([pin1.x, -1.5, -base.z/2])
        cube([2*wire_dia, (base.y-pin1.y+1), 3*wire_dia], center = true);
    translate([6.9, 3.8, -base.z/2])
        cube([pin1.y, 1.2*wire_dia, 2*base.z], center = true);

    translate([peg2.x, peg2.y, -base.z/2])
        difference() {
            d = peg2.z*2.5;
            cylinder(h=3*wire_dia, d=d, center = true);
            translate([0,-0.5*d,0]) cube([d, d, 3*wire_dia]);
        }
}

module diode_slot(){
    union(){
        // Diode Body + Other Leg
        translate([-2.45*grid, -1.5*grid, -0.75])
            rotate([0, 0, diode_angle]){
                cube([2.1, 3.8, 2.1], center = true);
            }

        translate([-2.45*grid, -1.5*grid, -base.z/2])
            rotate([0, 0, diode_angle]){
                translate([0, 0, 0])
                    cube([diode_dia, 8, 2.5], center = true);
                translate([1.3, 6, 0]) rotate([0, 0, -25])
                    cube([diode_dia, 5, 2.5], center = true);
                translate([0, -3.25, 0])
                    cylinder(h=2.5, d=1.75, center = true);
                translate([0, 3.25, 0])
                    cylinder(h=2.5, d=1.75, center = true);
            }
    }
}

module diode_mock(){
    translate([-2.45*grid, -1.5*grid, -0.75])
        rotate([0, 0, diode_angle])
            rotate([90, 0, 0]){
                cylinder(h=3.2, d=2, center = true);
                cylinder(h=100, d=diode_dia, center = true);
            }
}
